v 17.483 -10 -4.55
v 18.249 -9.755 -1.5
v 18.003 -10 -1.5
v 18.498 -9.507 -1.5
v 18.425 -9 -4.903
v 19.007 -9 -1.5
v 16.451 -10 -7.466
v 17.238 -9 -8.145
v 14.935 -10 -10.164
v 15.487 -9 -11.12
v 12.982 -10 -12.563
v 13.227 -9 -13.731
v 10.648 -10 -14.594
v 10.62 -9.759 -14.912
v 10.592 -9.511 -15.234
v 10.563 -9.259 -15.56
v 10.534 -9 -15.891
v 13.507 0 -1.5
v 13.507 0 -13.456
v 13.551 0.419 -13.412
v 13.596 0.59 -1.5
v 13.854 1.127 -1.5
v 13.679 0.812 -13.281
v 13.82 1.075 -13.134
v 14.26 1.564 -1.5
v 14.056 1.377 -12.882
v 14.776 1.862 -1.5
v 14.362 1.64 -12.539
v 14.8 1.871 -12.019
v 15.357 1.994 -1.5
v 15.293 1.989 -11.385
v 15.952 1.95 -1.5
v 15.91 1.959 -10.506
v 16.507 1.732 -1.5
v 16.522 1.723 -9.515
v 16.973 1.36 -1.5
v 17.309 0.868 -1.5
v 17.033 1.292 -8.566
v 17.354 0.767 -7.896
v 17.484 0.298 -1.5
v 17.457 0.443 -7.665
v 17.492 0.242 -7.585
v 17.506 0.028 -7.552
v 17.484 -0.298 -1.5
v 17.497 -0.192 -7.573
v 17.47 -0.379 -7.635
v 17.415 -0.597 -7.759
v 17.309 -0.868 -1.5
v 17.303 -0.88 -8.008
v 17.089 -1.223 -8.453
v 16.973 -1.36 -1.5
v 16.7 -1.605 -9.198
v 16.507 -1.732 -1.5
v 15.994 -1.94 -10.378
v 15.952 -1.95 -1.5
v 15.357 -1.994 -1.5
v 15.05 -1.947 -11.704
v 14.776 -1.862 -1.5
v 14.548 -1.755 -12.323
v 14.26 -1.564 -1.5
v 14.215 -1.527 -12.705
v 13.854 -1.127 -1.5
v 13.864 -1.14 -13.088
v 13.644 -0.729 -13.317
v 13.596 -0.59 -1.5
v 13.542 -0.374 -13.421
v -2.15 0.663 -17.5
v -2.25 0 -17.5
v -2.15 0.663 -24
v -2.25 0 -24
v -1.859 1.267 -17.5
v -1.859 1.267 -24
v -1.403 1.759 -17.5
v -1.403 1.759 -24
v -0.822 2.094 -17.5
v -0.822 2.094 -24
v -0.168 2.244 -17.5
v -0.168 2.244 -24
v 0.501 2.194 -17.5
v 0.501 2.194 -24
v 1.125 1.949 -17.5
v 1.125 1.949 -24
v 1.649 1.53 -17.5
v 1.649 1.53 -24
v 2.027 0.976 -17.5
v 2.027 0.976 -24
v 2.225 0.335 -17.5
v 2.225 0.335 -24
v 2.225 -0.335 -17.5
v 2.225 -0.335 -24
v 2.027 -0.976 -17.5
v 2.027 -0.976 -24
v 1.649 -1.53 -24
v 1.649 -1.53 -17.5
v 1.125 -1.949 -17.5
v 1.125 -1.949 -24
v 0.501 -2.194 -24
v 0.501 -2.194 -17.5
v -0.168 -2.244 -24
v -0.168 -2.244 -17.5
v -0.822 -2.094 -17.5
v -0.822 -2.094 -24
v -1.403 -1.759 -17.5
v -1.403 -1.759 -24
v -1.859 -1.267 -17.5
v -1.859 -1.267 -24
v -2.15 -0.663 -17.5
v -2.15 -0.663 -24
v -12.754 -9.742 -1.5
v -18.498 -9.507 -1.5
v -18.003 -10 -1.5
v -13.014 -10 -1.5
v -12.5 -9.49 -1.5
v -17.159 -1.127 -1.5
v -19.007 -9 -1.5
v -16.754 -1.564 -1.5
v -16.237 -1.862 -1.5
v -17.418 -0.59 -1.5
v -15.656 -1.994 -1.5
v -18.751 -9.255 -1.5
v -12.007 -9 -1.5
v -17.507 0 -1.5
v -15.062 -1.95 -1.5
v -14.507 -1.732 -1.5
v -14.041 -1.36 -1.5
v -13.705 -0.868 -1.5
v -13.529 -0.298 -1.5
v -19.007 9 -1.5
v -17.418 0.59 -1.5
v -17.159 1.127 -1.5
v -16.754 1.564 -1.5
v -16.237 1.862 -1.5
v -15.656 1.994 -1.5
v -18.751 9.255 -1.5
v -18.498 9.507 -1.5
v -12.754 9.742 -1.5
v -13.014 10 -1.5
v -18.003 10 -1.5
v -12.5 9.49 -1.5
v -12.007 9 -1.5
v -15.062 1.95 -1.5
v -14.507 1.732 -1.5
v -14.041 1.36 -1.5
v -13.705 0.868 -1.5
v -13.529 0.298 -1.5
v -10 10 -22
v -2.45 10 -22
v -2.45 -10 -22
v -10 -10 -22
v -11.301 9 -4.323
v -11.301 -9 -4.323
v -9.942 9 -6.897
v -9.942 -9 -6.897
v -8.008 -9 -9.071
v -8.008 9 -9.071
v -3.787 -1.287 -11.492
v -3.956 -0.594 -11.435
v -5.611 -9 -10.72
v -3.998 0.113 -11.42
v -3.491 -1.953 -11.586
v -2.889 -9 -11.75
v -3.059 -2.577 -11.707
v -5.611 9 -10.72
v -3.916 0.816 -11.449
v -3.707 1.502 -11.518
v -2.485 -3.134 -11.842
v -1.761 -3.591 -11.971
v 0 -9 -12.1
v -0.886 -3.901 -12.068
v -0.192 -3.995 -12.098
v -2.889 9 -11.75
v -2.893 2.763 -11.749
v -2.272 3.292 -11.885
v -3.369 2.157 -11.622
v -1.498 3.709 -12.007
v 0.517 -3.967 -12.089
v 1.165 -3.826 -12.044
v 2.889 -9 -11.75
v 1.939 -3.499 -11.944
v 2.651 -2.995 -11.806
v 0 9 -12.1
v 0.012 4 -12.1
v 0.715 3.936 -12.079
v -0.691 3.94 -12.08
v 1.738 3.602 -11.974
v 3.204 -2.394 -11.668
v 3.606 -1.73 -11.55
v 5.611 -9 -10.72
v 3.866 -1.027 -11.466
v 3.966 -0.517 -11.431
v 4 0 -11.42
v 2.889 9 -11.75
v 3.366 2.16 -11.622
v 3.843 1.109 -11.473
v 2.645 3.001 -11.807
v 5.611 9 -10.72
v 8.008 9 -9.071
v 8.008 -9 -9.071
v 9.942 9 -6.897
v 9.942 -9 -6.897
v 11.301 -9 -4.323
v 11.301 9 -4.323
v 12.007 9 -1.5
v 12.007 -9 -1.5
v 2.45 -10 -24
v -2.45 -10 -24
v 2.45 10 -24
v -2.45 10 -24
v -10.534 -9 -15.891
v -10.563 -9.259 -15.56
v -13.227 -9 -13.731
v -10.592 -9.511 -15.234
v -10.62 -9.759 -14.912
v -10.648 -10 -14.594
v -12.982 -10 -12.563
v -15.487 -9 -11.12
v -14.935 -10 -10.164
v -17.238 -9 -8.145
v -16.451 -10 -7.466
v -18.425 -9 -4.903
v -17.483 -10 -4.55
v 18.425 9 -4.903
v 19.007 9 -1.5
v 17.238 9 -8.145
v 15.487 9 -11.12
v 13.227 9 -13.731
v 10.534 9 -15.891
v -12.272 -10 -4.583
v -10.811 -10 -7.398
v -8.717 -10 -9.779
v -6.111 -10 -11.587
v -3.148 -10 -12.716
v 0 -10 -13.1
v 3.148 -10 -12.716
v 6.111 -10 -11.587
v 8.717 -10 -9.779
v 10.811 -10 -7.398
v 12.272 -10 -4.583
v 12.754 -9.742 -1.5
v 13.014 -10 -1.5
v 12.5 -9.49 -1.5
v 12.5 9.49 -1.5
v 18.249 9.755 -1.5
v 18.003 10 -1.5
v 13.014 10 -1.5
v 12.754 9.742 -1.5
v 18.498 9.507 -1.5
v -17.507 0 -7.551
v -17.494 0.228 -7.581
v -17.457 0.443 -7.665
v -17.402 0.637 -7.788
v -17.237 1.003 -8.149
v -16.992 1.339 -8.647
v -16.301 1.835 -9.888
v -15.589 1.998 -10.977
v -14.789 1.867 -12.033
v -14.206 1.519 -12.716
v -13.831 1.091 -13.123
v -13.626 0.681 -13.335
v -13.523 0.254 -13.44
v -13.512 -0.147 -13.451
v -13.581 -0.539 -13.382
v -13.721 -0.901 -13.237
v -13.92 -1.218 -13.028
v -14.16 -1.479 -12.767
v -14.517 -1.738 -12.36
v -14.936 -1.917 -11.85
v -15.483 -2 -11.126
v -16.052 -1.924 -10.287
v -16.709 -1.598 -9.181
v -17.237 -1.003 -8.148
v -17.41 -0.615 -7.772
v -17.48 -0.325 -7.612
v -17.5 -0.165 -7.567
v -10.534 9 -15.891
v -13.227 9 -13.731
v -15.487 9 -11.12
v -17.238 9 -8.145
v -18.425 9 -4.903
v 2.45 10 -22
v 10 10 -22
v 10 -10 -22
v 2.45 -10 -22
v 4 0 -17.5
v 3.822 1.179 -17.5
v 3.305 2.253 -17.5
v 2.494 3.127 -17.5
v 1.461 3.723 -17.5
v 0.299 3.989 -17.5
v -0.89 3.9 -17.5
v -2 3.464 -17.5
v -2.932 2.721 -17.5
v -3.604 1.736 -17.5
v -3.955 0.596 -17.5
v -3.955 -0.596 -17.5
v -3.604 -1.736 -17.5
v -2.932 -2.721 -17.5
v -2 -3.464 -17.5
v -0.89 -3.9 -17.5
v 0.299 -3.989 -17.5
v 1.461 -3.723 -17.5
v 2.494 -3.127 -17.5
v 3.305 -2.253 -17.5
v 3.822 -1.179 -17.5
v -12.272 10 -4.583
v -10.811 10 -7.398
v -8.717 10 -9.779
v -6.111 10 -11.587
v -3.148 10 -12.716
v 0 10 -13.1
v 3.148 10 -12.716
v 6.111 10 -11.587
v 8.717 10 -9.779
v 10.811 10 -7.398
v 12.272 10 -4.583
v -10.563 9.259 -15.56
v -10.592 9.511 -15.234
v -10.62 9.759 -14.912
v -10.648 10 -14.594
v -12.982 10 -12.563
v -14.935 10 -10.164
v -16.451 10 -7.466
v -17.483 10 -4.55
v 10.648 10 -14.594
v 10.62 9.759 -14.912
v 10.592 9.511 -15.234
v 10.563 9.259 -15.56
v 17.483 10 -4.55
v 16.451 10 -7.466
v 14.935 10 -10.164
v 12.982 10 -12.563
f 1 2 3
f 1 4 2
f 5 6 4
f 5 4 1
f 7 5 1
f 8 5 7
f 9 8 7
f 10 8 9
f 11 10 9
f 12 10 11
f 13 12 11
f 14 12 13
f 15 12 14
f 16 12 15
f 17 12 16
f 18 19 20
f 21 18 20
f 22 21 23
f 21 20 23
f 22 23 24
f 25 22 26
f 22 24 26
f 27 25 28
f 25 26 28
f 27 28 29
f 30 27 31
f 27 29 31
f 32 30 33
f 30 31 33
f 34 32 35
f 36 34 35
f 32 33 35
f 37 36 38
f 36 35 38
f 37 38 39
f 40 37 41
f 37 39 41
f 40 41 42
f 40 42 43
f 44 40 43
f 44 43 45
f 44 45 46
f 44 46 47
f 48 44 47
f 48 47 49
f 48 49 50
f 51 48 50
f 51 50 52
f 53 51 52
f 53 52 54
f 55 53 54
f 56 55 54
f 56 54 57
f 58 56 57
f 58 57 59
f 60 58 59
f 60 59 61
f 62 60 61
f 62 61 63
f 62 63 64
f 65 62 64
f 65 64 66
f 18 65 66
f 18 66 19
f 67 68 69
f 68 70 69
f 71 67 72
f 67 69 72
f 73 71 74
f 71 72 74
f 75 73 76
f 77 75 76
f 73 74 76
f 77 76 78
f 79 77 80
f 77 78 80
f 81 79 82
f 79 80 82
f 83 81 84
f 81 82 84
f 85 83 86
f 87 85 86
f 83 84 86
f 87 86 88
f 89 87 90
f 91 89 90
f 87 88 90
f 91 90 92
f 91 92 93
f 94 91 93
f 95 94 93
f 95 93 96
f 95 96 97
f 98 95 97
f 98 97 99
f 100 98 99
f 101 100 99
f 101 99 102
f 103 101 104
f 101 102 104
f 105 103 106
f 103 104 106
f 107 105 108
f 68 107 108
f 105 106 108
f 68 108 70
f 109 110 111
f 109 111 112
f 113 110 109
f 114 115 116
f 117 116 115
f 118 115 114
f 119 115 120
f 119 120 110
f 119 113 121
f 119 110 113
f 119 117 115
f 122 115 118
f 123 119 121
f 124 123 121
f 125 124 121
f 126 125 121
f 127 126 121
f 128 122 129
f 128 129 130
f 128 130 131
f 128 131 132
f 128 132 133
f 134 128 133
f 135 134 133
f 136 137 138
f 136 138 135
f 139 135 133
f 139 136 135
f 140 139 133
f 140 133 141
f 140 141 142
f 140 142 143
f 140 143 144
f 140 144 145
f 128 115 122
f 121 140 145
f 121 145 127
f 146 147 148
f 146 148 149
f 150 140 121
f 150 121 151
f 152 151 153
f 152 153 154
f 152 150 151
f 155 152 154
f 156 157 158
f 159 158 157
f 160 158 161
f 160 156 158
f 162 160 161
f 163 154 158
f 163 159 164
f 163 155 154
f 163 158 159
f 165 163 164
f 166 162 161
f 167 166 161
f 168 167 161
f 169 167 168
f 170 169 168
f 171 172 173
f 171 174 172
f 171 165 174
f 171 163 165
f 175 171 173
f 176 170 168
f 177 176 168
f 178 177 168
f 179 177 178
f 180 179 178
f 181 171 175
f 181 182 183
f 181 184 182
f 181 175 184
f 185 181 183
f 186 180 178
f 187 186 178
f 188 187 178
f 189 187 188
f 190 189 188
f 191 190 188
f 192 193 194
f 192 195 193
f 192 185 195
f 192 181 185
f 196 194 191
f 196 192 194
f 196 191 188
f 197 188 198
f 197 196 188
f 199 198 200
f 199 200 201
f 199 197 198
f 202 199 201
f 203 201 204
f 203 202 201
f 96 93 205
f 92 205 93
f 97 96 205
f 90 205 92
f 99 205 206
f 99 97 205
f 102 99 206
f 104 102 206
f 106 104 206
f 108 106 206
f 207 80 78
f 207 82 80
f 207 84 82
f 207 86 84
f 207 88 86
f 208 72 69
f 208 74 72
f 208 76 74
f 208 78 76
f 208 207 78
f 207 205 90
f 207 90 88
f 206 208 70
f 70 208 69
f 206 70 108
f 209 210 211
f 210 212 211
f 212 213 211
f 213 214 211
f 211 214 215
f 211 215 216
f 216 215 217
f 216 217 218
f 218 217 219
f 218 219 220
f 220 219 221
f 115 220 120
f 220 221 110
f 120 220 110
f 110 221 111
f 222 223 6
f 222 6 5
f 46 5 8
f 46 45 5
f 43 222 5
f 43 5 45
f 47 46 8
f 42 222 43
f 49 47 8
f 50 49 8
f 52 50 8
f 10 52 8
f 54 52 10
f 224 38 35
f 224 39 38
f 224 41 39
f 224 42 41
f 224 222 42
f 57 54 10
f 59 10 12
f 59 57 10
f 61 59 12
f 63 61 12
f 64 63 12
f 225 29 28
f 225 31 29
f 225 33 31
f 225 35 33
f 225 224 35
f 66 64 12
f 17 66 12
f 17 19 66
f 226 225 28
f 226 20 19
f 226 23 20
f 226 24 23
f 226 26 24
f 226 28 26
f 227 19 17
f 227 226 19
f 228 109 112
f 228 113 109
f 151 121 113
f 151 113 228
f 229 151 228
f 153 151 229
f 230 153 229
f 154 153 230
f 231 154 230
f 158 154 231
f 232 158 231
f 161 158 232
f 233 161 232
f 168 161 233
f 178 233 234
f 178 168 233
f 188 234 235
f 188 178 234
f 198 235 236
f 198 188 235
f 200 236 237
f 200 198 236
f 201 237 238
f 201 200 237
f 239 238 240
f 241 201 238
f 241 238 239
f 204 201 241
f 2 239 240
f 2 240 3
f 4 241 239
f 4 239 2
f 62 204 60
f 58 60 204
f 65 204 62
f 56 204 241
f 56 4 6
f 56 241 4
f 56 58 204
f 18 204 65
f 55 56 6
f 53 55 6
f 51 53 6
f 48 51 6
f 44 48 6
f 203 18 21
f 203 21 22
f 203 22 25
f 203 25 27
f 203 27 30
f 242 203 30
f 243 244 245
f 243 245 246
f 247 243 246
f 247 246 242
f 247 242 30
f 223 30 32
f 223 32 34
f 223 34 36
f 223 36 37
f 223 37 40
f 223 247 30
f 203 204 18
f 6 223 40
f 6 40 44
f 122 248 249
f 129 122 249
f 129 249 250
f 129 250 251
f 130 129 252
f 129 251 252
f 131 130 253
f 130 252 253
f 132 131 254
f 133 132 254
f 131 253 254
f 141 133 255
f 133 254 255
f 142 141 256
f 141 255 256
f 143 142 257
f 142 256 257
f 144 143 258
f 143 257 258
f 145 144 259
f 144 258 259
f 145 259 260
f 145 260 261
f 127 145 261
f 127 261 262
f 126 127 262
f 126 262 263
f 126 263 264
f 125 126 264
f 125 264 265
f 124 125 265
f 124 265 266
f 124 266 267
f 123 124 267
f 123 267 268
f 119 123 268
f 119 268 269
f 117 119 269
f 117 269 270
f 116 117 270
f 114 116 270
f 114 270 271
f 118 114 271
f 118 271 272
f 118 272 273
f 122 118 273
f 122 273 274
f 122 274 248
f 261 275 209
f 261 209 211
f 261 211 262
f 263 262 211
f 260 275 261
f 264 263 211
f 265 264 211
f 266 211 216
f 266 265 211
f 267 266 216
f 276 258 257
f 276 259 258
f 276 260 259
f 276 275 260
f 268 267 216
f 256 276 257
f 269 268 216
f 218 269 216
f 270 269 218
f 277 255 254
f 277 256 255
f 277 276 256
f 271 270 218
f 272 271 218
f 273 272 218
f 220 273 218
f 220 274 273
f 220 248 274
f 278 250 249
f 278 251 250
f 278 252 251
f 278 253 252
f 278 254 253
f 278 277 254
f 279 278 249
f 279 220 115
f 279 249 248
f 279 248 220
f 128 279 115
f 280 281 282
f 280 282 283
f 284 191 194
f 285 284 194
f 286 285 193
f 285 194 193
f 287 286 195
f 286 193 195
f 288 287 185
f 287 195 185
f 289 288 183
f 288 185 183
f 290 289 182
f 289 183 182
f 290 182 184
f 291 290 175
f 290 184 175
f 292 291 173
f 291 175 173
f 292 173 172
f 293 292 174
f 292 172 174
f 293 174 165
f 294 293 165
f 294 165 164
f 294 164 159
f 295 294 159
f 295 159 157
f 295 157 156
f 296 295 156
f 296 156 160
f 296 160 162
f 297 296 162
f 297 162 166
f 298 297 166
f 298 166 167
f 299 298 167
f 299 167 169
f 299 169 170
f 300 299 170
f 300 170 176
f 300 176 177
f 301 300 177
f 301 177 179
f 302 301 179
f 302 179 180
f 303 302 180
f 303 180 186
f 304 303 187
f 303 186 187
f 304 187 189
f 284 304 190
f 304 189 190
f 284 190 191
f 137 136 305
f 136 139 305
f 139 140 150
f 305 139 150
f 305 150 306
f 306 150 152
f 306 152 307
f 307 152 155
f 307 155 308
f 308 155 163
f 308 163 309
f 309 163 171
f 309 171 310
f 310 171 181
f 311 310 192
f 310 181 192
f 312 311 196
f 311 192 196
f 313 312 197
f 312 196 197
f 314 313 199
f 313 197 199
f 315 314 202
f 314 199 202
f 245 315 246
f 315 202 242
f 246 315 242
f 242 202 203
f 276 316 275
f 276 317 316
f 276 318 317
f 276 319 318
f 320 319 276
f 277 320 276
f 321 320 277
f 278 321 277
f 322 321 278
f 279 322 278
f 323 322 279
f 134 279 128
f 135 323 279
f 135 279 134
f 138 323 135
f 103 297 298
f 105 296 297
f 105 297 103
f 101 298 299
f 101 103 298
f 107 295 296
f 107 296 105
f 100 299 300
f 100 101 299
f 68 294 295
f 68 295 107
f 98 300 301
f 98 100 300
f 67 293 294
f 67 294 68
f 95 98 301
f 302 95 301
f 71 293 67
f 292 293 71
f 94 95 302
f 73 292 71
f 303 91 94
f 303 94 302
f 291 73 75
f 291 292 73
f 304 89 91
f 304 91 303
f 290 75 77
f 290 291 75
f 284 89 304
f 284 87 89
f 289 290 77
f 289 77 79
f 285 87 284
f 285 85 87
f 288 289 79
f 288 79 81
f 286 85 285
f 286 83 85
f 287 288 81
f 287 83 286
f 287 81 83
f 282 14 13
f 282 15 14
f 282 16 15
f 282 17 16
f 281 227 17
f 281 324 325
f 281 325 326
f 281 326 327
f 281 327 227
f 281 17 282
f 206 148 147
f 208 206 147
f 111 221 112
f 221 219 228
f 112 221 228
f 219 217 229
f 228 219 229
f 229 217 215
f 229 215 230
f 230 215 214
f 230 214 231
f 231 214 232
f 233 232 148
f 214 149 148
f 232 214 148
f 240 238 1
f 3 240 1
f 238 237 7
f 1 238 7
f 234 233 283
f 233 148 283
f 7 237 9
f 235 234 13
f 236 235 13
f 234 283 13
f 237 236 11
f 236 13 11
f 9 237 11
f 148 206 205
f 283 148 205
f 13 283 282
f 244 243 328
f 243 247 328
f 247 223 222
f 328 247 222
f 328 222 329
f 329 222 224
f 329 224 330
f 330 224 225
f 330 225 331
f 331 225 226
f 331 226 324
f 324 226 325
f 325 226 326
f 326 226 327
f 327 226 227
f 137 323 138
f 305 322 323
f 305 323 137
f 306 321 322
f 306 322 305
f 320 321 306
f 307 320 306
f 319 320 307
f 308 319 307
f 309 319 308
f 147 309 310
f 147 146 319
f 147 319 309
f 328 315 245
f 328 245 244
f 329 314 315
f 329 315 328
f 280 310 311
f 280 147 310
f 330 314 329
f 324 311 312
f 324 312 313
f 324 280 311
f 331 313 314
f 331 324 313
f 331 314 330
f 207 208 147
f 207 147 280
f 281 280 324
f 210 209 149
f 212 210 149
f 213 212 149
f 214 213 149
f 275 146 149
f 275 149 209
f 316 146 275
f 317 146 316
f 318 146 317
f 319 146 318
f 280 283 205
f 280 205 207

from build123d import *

# Parameters (mm, degrees)
AUFSATZ_LINEAR_AUSTRAGEN1_DEPTH                      = 10
SKIZZE4_W                                            = 4.9
SKIZZE4_H                                            = 20
AUFSATZ_LINEAR_AUSTRAGEN2_DEPTH                      = 2
STIRNSENKUNG_F_R_M4_ZYLINDERSCHRAUBE_MIT_D           = 4.5
STIRNSENKUNG_F_R_M4_ZYLINDERSCHRAUBE_MIT_CBORE_D     = 8
STIRNSENKUNG_F_R_M4_ZYLINDERSCHRAUBE_MIT_CBORE_DEPTH = 16
F_4_0_4_DURCHMESSER_BOHRUNG1_D                       = 4
FASE1_SIZE                                           = 1


with BuildPart() as part:
    # Skizze1 → Aufsatz-Linear austragen1 (new body, symmetric)
    with BuildSketch(Plane(origin=(0, 0, 0), x_dir=(1, 0, 0), z_dir=(0, 1, 0))):
        with BuildLine():
            ThreePointArc((-10.534455372, 15.89114714), (-16.430025091, 9.672516887), (-19.006664816, 1.5))
            Line((-19.006664816, 1.5), (-12.006664816, 1.5))
            ThreePointArc((-12.006664816, 1.5), (0, 12.1), (12.006664816, 1.5))
            Line((12.006664816, 1.5), (19.006664816, 1.5))
            ThreePointArc((19.006664816, 1.5), (16.430025091, 9.672516887), (10.534455372, 15.89114714))
            Line((10.534455372, 15.89114714), (10, 22))
            Line((10, 22), (-10, 22))
            Line((-10, 22), (-10.534455372, 15.89114714))
        make_face()
    extrude(amount=AUFSATZ_LINEAR_AUSTRAGEN1_DEPTH, both=True)

    # Skizze4 → Aufsatz-Linear austragen2 (add)
    with BuildSketch(Plane(origin=(0, 0, -22), x_dir=(-1, 0, 0), z_dir=(0, 0, -1))):
        Rectangle(SKIZZE4_W, SKIZZE4_H)
    extrude(amount=AUFSATZ_LINEAR_AUSTRAGEN2_DEPTH)

    # Stirnsenkung für M4 Zylinderschraube mit Innensechskant1 (through all)
    with Locations(Plane.XY.offset(-1.5)):
        with Locations((0, 0)):
            CounterBoreHole(STIRNSENKUNG_F_R_M4_ZYLINDERSCHRAUBE_MIT_D / 2, STIRNSENKUNG_F_R_M4_ZYLINDERSCHRAUBE_MIT_CBORE_D / 2, STIRNSENKUNG_F_R_M4_ZYLINDERSCHRAUBE_MIT_CBORE_DEPTH)

    # Ø4.0 (4) Durchmesser Bohrung1 (through all)
    with Locations(Plane.XY.offset(-1.5)):
        with Locations((-15.506664816, 0), (15.506664816, 0)):
            Hole(F_4_0_4_DURCHMESSER_BOHRUNG1_D / 2)

    # Fase1
    fase1_edges = [part.edges().sort_by_distance(p)[0] for p in [
        (0, -10, -12.1),
        (-16.430025091, -10, -9.672516887),
        (16.430025091, -10, -9.672516887),
        (-16.430025091, 10, -9.672516887),
        (0, 10, -12.1),
        (16.430025091, 10, -9.672516887),
    ]]
    chamfer(fase1_edges, length=FASE1_SIZE)


solid = part.part
